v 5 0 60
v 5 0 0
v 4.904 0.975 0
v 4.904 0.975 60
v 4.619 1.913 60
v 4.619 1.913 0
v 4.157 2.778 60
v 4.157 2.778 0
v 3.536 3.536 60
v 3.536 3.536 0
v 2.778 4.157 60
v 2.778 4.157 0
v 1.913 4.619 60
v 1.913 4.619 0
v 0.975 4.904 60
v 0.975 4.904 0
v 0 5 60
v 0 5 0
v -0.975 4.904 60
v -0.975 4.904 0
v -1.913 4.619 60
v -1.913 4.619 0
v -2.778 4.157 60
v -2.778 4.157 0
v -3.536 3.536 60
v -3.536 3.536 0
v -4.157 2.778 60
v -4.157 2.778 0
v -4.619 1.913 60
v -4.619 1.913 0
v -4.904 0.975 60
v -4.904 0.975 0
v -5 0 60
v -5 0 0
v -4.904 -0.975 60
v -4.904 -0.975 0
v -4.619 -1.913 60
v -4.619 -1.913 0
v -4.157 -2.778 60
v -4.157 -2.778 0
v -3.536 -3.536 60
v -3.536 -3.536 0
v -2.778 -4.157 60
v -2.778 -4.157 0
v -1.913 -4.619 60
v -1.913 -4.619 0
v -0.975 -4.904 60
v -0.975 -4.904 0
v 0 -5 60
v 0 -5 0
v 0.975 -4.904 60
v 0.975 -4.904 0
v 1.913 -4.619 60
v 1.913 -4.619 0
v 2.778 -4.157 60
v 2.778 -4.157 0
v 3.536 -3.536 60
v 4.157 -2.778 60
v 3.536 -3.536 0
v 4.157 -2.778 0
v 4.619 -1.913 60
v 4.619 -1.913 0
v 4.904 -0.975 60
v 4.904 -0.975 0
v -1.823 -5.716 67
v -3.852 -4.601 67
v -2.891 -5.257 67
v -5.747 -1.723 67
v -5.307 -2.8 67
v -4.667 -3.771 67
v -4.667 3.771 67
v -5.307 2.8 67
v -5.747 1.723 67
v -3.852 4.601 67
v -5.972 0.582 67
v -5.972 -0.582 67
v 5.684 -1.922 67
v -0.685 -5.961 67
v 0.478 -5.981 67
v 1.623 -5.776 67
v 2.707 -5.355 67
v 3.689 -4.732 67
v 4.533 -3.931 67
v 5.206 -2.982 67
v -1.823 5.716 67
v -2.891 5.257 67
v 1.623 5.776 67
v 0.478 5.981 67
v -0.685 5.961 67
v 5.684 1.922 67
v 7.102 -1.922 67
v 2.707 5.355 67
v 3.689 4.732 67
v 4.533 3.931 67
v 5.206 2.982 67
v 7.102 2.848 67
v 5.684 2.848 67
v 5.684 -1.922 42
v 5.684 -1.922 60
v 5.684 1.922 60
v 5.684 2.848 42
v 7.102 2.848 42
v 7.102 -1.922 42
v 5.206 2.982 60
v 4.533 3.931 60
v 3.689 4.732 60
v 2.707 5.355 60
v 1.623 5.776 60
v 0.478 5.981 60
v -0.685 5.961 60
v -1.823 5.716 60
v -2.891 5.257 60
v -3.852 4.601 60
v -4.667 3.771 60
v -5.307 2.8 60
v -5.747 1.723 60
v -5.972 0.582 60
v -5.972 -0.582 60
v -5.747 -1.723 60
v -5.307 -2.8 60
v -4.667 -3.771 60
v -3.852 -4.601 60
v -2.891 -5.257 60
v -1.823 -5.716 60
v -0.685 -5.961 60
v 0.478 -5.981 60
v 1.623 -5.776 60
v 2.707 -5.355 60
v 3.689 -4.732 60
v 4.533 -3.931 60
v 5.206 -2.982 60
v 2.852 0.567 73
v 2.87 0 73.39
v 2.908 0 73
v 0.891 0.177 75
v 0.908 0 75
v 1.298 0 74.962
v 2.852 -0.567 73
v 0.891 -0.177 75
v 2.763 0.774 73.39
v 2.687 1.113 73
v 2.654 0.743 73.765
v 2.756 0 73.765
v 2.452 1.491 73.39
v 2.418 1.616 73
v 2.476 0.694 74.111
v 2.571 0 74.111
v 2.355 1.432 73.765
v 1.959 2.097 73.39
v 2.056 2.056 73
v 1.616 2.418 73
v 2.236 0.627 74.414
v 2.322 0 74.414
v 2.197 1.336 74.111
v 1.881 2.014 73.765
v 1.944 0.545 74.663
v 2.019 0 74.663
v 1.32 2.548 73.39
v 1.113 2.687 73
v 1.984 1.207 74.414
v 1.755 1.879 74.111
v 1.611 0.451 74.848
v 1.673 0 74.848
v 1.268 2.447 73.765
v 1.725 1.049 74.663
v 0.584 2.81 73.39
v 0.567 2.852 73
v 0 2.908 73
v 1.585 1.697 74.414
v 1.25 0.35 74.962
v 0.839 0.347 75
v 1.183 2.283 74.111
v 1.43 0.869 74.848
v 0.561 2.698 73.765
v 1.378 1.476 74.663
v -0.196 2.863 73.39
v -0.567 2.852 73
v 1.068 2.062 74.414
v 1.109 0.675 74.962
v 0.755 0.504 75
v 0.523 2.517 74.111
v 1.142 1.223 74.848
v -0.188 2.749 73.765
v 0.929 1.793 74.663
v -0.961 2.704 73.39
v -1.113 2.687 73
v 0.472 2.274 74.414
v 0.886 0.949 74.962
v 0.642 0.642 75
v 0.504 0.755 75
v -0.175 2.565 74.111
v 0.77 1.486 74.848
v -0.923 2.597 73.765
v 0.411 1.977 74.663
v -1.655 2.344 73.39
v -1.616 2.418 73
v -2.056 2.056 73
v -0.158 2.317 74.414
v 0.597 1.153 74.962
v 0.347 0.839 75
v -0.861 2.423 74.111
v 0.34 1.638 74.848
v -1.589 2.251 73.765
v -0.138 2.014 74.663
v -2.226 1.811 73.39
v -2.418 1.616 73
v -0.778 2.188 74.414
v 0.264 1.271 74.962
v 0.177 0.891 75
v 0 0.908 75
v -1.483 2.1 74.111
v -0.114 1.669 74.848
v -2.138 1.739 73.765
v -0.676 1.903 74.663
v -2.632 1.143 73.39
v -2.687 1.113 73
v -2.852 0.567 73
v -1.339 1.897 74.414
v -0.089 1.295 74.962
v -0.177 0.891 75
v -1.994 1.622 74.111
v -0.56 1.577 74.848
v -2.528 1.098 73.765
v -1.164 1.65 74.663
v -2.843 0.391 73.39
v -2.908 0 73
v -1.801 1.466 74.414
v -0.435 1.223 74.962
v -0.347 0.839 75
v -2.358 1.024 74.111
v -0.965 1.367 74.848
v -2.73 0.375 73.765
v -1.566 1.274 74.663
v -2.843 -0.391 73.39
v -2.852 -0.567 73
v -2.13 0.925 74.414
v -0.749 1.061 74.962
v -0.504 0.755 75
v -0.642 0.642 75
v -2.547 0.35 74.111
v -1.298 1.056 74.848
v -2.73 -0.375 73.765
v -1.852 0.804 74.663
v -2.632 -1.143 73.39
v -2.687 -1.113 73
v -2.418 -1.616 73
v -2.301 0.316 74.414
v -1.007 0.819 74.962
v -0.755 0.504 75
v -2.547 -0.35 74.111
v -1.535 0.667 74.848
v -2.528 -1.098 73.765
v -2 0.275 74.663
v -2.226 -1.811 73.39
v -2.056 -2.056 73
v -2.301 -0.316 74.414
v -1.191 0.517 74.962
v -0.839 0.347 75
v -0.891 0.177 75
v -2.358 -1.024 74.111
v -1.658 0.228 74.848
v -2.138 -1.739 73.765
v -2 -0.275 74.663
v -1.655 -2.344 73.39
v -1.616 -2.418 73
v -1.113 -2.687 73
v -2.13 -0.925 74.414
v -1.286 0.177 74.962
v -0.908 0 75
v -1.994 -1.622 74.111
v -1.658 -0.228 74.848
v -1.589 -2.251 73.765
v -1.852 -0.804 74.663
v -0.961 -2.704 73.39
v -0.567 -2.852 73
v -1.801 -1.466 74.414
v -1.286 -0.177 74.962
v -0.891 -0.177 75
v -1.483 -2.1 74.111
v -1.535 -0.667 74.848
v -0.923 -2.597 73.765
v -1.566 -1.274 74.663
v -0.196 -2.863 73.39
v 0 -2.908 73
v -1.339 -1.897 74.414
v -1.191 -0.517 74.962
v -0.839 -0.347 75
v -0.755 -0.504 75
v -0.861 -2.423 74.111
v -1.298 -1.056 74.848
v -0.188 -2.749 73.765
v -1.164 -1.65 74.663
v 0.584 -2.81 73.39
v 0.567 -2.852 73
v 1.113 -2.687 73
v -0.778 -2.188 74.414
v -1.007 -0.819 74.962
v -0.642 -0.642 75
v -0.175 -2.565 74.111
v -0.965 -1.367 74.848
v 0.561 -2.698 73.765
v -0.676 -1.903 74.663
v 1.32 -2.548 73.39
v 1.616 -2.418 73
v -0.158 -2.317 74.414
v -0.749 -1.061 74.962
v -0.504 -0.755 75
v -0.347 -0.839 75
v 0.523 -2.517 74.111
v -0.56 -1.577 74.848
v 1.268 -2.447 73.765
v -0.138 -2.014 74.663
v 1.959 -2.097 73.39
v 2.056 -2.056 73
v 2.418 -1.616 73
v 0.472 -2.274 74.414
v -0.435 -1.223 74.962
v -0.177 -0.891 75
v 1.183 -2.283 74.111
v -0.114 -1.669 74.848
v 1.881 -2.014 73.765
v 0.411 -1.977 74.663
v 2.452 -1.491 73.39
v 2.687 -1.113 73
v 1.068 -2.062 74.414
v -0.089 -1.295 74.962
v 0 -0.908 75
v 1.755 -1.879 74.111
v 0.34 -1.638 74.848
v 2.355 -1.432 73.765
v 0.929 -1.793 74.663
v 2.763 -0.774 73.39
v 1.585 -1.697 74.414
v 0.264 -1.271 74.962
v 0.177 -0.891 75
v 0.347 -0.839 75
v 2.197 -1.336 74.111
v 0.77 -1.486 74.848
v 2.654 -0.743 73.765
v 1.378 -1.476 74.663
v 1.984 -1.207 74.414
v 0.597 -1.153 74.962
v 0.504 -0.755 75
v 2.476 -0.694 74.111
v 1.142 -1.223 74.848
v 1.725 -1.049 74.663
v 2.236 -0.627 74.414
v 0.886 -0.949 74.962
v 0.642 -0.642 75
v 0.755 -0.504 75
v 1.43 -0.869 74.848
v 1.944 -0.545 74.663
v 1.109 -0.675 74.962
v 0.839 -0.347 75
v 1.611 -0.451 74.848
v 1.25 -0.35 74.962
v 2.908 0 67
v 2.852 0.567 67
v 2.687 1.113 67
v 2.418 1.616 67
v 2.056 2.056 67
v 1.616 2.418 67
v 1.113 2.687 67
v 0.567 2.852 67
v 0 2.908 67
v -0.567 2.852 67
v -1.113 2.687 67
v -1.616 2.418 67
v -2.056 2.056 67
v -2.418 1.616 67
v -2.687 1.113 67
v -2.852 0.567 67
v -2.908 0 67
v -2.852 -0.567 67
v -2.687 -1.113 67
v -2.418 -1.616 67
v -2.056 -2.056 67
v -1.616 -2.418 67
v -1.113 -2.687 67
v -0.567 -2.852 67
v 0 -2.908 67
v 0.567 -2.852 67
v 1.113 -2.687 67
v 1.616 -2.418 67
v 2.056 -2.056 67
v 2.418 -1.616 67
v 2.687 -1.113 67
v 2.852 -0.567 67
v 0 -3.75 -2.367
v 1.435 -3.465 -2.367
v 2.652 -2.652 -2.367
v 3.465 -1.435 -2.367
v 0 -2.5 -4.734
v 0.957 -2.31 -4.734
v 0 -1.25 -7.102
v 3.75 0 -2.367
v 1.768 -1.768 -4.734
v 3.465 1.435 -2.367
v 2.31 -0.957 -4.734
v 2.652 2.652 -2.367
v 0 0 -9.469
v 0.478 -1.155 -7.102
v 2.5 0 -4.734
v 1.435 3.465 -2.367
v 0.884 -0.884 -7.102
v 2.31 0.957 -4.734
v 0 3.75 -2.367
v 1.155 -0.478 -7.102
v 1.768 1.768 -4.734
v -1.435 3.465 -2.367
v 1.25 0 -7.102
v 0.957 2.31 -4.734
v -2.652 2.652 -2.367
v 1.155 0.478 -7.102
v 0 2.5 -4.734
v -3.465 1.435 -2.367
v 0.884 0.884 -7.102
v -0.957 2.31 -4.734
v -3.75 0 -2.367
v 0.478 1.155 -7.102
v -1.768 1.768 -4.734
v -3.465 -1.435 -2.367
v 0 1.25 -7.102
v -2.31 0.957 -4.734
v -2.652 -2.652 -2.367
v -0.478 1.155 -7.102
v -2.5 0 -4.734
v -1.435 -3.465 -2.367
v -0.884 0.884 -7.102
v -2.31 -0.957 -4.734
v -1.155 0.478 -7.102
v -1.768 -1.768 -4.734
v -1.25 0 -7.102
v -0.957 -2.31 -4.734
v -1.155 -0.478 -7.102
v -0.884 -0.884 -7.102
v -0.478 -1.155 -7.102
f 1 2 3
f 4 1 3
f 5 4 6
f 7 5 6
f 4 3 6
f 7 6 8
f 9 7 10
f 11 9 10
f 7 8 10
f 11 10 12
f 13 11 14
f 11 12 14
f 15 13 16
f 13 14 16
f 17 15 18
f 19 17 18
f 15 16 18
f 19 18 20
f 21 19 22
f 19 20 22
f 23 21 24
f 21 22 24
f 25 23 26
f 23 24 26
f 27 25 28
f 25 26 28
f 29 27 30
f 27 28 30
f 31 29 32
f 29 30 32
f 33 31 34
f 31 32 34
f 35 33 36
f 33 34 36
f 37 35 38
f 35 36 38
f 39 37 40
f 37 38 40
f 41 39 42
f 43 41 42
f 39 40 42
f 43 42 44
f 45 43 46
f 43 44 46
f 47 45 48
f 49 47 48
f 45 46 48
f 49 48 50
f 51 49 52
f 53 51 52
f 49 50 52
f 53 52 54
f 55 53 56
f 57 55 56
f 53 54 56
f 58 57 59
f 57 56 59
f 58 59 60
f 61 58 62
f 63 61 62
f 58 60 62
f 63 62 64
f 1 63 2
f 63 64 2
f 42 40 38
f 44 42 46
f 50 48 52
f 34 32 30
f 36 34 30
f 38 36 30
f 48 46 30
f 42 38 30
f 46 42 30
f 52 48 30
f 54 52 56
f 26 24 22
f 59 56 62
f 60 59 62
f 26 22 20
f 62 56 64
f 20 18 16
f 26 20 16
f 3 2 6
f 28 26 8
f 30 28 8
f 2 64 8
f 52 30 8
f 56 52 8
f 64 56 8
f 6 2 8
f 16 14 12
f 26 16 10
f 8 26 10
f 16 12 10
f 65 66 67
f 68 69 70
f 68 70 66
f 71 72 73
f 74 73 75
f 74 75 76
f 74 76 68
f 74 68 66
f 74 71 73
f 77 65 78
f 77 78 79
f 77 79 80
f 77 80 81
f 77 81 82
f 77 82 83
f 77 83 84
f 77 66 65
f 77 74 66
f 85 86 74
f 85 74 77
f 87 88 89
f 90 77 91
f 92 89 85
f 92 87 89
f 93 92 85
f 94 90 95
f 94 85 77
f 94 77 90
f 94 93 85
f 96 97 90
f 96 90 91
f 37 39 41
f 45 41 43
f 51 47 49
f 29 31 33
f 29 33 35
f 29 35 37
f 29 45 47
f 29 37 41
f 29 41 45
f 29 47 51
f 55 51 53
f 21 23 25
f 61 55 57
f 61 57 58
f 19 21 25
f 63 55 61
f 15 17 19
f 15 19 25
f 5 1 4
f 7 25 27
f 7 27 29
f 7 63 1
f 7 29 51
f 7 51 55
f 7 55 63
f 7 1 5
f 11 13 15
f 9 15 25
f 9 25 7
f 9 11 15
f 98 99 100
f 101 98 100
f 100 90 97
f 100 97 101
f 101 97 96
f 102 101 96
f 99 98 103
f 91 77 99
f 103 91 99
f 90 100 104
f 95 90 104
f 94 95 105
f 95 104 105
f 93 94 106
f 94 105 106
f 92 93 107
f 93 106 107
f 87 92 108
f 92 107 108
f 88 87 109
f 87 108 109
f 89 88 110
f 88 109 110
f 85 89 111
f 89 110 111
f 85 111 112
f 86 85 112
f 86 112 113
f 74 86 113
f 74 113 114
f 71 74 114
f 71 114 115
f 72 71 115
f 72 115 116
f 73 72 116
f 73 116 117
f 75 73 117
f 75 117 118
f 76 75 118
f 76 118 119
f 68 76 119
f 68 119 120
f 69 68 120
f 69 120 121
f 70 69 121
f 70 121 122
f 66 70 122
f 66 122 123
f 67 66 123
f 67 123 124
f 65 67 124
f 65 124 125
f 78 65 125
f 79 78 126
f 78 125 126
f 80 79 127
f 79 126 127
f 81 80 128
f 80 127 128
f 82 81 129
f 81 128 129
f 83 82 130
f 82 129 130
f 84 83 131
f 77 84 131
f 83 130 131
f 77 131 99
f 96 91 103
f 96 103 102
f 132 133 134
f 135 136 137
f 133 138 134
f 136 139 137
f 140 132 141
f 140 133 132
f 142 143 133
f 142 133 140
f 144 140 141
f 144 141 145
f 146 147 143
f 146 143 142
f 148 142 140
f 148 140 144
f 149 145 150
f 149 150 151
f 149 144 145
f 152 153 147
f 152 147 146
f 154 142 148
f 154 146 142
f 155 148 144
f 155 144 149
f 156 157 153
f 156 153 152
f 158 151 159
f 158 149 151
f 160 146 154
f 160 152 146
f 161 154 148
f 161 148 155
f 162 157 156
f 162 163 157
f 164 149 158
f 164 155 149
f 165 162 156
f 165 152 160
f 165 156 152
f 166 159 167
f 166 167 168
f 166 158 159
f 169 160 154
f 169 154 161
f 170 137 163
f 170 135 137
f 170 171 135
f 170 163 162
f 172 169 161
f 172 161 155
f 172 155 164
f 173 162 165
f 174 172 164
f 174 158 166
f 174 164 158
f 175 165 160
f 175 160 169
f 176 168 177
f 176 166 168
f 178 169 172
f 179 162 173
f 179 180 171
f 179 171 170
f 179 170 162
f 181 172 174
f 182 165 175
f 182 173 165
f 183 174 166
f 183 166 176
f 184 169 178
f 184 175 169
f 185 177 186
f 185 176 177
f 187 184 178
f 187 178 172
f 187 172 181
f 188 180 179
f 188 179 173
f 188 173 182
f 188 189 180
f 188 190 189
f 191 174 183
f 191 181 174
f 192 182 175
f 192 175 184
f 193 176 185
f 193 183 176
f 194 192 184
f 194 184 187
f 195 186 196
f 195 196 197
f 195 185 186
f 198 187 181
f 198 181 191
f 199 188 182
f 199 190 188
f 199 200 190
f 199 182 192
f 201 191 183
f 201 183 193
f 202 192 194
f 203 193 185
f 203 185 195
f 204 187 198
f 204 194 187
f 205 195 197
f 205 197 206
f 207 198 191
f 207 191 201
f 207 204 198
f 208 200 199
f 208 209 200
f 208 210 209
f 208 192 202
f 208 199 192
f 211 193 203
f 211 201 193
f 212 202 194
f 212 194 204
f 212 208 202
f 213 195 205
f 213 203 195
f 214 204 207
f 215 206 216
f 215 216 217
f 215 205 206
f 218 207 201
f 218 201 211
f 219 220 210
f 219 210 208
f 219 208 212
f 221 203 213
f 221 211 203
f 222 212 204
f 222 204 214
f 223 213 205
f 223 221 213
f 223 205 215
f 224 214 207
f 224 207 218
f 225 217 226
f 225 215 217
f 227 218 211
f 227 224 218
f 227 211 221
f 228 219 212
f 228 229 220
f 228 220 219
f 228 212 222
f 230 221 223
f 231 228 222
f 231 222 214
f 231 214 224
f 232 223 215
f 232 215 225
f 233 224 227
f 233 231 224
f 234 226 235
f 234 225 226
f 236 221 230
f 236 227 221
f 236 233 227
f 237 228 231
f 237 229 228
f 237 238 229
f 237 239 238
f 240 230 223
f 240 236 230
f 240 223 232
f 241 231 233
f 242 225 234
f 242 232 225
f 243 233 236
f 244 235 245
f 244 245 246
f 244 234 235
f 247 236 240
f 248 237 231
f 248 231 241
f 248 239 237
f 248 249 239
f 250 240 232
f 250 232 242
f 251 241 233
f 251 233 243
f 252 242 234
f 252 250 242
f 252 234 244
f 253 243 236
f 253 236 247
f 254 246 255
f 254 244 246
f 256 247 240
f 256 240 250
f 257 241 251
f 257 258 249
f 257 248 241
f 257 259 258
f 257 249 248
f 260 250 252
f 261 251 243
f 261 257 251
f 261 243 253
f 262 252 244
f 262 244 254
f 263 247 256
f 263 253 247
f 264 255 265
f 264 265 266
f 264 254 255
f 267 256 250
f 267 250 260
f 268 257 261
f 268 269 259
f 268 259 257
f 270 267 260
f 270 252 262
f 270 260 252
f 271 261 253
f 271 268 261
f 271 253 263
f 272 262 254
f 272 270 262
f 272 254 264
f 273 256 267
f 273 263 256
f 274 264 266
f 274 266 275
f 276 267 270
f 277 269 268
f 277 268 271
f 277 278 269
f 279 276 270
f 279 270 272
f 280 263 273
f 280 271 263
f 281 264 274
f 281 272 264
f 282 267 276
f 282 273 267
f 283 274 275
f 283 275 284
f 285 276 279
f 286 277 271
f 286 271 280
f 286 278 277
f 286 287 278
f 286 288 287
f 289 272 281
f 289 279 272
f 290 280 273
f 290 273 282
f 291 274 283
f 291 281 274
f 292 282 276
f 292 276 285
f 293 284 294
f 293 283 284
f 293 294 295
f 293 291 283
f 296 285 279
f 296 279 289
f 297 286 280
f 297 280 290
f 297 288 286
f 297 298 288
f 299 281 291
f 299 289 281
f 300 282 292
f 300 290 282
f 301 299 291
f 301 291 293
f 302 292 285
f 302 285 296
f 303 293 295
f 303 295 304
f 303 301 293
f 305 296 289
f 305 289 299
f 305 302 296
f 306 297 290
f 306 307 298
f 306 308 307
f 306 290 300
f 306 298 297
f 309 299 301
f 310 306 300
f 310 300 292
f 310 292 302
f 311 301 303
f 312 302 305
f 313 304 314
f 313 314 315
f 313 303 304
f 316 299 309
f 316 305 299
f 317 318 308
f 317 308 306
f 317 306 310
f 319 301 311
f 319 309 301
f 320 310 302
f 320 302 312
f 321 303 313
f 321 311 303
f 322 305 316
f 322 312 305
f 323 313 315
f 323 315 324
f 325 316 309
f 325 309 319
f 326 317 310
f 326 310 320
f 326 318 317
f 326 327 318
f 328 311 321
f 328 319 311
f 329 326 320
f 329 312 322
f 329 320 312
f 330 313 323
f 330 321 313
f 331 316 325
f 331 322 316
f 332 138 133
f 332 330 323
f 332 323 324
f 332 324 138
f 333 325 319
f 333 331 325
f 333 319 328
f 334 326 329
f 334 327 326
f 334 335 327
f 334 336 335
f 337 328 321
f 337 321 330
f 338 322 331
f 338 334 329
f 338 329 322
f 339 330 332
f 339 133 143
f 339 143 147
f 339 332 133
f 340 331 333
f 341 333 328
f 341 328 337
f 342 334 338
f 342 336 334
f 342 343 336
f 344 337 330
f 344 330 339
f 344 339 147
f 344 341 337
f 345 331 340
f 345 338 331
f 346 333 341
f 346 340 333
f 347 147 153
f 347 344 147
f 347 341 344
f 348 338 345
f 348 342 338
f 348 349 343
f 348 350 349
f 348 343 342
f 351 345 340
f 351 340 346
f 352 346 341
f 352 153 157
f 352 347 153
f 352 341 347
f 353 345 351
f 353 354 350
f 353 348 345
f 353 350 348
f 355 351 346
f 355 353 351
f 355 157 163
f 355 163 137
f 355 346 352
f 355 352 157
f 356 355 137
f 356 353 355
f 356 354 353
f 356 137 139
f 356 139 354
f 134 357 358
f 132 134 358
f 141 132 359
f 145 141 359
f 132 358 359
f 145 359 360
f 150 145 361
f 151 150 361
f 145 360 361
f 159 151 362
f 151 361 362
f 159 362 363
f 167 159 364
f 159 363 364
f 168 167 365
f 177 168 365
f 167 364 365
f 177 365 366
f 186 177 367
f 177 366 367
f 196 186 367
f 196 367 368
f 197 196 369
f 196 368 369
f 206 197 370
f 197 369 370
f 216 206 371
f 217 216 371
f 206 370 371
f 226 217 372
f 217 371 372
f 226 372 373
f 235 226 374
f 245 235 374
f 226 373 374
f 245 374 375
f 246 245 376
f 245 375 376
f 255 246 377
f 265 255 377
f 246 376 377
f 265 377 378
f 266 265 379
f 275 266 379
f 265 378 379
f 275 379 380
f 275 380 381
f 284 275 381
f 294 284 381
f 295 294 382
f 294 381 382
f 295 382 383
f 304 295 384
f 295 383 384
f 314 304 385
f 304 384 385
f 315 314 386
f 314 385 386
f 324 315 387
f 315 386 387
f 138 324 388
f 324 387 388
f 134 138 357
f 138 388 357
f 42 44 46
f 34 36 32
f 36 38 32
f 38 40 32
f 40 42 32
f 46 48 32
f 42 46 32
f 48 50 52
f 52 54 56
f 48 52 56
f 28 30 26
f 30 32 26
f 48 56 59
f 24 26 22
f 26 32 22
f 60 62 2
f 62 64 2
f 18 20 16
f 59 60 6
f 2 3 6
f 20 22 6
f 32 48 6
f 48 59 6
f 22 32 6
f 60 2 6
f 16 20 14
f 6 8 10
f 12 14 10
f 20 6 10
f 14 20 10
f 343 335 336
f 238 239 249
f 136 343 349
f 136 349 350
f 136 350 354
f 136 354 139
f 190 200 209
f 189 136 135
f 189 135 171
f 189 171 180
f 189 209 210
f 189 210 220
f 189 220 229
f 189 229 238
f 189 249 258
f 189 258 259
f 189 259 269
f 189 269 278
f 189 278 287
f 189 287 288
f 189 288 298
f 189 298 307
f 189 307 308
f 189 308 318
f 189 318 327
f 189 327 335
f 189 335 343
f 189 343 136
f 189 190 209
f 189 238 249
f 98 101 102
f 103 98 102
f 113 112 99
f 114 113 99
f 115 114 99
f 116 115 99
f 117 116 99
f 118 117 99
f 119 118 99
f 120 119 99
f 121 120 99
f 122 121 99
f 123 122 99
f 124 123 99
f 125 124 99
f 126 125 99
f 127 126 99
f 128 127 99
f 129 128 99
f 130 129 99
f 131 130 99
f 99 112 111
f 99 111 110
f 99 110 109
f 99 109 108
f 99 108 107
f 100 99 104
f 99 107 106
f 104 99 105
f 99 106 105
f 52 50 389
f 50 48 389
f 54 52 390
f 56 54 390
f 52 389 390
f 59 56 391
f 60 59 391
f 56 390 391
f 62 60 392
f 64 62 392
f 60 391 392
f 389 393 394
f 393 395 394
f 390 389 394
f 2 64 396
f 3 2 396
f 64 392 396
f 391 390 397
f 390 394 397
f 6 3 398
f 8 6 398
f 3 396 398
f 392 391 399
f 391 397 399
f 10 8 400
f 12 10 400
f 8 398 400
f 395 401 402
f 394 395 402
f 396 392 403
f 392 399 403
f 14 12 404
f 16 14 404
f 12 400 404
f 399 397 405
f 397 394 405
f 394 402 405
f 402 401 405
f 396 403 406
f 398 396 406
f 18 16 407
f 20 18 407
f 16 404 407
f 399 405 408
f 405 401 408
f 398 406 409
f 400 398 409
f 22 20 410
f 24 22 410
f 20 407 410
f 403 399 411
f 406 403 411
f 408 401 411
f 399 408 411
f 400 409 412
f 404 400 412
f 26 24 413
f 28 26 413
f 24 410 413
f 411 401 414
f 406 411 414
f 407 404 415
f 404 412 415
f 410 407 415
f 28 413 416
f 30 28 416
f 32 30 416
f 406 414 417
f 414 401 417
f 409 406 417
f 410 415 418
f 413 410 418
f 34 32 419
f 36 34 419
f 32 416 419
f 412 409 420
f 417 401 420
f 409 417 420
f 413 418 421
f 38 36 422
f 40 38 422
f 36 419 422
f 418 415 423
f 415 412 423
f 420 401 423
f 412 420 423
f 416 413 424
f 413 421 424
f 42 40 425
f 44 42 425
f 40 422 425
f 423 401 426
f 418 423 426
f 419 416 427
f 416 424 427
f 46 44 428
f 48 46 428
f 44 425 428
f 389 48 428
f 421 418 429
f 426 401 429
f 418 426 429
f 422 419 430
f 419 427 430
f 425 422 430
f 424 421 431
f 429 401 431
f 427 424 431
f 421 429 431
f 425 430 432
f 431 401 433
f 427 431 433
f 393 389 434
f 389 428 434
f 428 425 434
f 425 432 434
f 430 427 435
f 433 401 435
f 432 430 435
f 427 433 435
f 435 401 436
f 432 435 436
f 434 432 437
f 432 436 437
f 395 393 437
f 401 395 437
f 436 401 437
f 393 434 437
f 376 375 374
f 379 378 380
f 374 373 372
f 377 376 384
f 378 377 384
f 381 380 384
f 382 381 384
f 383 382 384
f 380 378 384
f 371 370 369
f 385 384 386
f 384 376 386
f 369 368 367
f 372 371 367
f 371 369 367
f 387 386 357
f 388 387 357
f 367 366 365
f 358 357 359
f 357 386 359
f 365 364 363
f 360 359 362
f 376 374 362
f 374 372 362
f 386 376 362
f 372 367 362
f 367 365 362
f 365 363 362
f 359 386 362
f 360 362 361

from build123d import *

# Parameters (mm, degrees)
F0_R     = 5
F1_DEPTH = 60
F4_R     = 6
F5_DEPTH = 7
F6_W     = 1.418485
F6_H     = 4.770194
F7_DEPTH = 25
F8_R     = 2.908014
F9_DEPTH = 8
F10_R    = 2


with BuildPart() as f1:
    # F0 (on Top) → F1 (new body)
    with BuildSketch(Plane.XY):
        Circle(F0_R)
    extrude(amount=F1_DEPTH)


with BuildPart() as f3:
    # F2 (on Right) → F3 (revolve)
    with BuildSketch(Plane.YZ):
        Polygon((0, -9.468908), (0, 0), (-5, 0), align=None)
    revolve(axis=Axis((0, 0, -4.734454), (0, 0, 1)))


with BuildPart() as f5:
    # F4 (on face) → F5 (new body)
    with BuildSketch(Plane.XY.offset(60)):
        Circle(F4_R)
    extrude(amount=F5_DEPTH)

    # F6 (on face) → F7 (join)
    with BuildSketch(Plane.XY.offset(67)):
        with Locations((6.393168, 0.463383)):
            Rectangle(F6_W, F6_H)
    extrude(amount=-F7_DEPTH)


with BuildPart() as f9:
    # F8 (on face) → F9 (new body)
    with BuildSketch(Plane.XY.offset(67)):
        Circle(F8_R)
    extrude(amount=F9_DEPTH)

    # F10
    f10_edges = [f9.edges().sort_by_distance(p)[0] for p in [
        (-2.908014, 0, 75),
    ]]
    fillet(f10_edges, radius=F10_R)


solid = Compound([f1.part, f3.part, f5.part, f9.part])
